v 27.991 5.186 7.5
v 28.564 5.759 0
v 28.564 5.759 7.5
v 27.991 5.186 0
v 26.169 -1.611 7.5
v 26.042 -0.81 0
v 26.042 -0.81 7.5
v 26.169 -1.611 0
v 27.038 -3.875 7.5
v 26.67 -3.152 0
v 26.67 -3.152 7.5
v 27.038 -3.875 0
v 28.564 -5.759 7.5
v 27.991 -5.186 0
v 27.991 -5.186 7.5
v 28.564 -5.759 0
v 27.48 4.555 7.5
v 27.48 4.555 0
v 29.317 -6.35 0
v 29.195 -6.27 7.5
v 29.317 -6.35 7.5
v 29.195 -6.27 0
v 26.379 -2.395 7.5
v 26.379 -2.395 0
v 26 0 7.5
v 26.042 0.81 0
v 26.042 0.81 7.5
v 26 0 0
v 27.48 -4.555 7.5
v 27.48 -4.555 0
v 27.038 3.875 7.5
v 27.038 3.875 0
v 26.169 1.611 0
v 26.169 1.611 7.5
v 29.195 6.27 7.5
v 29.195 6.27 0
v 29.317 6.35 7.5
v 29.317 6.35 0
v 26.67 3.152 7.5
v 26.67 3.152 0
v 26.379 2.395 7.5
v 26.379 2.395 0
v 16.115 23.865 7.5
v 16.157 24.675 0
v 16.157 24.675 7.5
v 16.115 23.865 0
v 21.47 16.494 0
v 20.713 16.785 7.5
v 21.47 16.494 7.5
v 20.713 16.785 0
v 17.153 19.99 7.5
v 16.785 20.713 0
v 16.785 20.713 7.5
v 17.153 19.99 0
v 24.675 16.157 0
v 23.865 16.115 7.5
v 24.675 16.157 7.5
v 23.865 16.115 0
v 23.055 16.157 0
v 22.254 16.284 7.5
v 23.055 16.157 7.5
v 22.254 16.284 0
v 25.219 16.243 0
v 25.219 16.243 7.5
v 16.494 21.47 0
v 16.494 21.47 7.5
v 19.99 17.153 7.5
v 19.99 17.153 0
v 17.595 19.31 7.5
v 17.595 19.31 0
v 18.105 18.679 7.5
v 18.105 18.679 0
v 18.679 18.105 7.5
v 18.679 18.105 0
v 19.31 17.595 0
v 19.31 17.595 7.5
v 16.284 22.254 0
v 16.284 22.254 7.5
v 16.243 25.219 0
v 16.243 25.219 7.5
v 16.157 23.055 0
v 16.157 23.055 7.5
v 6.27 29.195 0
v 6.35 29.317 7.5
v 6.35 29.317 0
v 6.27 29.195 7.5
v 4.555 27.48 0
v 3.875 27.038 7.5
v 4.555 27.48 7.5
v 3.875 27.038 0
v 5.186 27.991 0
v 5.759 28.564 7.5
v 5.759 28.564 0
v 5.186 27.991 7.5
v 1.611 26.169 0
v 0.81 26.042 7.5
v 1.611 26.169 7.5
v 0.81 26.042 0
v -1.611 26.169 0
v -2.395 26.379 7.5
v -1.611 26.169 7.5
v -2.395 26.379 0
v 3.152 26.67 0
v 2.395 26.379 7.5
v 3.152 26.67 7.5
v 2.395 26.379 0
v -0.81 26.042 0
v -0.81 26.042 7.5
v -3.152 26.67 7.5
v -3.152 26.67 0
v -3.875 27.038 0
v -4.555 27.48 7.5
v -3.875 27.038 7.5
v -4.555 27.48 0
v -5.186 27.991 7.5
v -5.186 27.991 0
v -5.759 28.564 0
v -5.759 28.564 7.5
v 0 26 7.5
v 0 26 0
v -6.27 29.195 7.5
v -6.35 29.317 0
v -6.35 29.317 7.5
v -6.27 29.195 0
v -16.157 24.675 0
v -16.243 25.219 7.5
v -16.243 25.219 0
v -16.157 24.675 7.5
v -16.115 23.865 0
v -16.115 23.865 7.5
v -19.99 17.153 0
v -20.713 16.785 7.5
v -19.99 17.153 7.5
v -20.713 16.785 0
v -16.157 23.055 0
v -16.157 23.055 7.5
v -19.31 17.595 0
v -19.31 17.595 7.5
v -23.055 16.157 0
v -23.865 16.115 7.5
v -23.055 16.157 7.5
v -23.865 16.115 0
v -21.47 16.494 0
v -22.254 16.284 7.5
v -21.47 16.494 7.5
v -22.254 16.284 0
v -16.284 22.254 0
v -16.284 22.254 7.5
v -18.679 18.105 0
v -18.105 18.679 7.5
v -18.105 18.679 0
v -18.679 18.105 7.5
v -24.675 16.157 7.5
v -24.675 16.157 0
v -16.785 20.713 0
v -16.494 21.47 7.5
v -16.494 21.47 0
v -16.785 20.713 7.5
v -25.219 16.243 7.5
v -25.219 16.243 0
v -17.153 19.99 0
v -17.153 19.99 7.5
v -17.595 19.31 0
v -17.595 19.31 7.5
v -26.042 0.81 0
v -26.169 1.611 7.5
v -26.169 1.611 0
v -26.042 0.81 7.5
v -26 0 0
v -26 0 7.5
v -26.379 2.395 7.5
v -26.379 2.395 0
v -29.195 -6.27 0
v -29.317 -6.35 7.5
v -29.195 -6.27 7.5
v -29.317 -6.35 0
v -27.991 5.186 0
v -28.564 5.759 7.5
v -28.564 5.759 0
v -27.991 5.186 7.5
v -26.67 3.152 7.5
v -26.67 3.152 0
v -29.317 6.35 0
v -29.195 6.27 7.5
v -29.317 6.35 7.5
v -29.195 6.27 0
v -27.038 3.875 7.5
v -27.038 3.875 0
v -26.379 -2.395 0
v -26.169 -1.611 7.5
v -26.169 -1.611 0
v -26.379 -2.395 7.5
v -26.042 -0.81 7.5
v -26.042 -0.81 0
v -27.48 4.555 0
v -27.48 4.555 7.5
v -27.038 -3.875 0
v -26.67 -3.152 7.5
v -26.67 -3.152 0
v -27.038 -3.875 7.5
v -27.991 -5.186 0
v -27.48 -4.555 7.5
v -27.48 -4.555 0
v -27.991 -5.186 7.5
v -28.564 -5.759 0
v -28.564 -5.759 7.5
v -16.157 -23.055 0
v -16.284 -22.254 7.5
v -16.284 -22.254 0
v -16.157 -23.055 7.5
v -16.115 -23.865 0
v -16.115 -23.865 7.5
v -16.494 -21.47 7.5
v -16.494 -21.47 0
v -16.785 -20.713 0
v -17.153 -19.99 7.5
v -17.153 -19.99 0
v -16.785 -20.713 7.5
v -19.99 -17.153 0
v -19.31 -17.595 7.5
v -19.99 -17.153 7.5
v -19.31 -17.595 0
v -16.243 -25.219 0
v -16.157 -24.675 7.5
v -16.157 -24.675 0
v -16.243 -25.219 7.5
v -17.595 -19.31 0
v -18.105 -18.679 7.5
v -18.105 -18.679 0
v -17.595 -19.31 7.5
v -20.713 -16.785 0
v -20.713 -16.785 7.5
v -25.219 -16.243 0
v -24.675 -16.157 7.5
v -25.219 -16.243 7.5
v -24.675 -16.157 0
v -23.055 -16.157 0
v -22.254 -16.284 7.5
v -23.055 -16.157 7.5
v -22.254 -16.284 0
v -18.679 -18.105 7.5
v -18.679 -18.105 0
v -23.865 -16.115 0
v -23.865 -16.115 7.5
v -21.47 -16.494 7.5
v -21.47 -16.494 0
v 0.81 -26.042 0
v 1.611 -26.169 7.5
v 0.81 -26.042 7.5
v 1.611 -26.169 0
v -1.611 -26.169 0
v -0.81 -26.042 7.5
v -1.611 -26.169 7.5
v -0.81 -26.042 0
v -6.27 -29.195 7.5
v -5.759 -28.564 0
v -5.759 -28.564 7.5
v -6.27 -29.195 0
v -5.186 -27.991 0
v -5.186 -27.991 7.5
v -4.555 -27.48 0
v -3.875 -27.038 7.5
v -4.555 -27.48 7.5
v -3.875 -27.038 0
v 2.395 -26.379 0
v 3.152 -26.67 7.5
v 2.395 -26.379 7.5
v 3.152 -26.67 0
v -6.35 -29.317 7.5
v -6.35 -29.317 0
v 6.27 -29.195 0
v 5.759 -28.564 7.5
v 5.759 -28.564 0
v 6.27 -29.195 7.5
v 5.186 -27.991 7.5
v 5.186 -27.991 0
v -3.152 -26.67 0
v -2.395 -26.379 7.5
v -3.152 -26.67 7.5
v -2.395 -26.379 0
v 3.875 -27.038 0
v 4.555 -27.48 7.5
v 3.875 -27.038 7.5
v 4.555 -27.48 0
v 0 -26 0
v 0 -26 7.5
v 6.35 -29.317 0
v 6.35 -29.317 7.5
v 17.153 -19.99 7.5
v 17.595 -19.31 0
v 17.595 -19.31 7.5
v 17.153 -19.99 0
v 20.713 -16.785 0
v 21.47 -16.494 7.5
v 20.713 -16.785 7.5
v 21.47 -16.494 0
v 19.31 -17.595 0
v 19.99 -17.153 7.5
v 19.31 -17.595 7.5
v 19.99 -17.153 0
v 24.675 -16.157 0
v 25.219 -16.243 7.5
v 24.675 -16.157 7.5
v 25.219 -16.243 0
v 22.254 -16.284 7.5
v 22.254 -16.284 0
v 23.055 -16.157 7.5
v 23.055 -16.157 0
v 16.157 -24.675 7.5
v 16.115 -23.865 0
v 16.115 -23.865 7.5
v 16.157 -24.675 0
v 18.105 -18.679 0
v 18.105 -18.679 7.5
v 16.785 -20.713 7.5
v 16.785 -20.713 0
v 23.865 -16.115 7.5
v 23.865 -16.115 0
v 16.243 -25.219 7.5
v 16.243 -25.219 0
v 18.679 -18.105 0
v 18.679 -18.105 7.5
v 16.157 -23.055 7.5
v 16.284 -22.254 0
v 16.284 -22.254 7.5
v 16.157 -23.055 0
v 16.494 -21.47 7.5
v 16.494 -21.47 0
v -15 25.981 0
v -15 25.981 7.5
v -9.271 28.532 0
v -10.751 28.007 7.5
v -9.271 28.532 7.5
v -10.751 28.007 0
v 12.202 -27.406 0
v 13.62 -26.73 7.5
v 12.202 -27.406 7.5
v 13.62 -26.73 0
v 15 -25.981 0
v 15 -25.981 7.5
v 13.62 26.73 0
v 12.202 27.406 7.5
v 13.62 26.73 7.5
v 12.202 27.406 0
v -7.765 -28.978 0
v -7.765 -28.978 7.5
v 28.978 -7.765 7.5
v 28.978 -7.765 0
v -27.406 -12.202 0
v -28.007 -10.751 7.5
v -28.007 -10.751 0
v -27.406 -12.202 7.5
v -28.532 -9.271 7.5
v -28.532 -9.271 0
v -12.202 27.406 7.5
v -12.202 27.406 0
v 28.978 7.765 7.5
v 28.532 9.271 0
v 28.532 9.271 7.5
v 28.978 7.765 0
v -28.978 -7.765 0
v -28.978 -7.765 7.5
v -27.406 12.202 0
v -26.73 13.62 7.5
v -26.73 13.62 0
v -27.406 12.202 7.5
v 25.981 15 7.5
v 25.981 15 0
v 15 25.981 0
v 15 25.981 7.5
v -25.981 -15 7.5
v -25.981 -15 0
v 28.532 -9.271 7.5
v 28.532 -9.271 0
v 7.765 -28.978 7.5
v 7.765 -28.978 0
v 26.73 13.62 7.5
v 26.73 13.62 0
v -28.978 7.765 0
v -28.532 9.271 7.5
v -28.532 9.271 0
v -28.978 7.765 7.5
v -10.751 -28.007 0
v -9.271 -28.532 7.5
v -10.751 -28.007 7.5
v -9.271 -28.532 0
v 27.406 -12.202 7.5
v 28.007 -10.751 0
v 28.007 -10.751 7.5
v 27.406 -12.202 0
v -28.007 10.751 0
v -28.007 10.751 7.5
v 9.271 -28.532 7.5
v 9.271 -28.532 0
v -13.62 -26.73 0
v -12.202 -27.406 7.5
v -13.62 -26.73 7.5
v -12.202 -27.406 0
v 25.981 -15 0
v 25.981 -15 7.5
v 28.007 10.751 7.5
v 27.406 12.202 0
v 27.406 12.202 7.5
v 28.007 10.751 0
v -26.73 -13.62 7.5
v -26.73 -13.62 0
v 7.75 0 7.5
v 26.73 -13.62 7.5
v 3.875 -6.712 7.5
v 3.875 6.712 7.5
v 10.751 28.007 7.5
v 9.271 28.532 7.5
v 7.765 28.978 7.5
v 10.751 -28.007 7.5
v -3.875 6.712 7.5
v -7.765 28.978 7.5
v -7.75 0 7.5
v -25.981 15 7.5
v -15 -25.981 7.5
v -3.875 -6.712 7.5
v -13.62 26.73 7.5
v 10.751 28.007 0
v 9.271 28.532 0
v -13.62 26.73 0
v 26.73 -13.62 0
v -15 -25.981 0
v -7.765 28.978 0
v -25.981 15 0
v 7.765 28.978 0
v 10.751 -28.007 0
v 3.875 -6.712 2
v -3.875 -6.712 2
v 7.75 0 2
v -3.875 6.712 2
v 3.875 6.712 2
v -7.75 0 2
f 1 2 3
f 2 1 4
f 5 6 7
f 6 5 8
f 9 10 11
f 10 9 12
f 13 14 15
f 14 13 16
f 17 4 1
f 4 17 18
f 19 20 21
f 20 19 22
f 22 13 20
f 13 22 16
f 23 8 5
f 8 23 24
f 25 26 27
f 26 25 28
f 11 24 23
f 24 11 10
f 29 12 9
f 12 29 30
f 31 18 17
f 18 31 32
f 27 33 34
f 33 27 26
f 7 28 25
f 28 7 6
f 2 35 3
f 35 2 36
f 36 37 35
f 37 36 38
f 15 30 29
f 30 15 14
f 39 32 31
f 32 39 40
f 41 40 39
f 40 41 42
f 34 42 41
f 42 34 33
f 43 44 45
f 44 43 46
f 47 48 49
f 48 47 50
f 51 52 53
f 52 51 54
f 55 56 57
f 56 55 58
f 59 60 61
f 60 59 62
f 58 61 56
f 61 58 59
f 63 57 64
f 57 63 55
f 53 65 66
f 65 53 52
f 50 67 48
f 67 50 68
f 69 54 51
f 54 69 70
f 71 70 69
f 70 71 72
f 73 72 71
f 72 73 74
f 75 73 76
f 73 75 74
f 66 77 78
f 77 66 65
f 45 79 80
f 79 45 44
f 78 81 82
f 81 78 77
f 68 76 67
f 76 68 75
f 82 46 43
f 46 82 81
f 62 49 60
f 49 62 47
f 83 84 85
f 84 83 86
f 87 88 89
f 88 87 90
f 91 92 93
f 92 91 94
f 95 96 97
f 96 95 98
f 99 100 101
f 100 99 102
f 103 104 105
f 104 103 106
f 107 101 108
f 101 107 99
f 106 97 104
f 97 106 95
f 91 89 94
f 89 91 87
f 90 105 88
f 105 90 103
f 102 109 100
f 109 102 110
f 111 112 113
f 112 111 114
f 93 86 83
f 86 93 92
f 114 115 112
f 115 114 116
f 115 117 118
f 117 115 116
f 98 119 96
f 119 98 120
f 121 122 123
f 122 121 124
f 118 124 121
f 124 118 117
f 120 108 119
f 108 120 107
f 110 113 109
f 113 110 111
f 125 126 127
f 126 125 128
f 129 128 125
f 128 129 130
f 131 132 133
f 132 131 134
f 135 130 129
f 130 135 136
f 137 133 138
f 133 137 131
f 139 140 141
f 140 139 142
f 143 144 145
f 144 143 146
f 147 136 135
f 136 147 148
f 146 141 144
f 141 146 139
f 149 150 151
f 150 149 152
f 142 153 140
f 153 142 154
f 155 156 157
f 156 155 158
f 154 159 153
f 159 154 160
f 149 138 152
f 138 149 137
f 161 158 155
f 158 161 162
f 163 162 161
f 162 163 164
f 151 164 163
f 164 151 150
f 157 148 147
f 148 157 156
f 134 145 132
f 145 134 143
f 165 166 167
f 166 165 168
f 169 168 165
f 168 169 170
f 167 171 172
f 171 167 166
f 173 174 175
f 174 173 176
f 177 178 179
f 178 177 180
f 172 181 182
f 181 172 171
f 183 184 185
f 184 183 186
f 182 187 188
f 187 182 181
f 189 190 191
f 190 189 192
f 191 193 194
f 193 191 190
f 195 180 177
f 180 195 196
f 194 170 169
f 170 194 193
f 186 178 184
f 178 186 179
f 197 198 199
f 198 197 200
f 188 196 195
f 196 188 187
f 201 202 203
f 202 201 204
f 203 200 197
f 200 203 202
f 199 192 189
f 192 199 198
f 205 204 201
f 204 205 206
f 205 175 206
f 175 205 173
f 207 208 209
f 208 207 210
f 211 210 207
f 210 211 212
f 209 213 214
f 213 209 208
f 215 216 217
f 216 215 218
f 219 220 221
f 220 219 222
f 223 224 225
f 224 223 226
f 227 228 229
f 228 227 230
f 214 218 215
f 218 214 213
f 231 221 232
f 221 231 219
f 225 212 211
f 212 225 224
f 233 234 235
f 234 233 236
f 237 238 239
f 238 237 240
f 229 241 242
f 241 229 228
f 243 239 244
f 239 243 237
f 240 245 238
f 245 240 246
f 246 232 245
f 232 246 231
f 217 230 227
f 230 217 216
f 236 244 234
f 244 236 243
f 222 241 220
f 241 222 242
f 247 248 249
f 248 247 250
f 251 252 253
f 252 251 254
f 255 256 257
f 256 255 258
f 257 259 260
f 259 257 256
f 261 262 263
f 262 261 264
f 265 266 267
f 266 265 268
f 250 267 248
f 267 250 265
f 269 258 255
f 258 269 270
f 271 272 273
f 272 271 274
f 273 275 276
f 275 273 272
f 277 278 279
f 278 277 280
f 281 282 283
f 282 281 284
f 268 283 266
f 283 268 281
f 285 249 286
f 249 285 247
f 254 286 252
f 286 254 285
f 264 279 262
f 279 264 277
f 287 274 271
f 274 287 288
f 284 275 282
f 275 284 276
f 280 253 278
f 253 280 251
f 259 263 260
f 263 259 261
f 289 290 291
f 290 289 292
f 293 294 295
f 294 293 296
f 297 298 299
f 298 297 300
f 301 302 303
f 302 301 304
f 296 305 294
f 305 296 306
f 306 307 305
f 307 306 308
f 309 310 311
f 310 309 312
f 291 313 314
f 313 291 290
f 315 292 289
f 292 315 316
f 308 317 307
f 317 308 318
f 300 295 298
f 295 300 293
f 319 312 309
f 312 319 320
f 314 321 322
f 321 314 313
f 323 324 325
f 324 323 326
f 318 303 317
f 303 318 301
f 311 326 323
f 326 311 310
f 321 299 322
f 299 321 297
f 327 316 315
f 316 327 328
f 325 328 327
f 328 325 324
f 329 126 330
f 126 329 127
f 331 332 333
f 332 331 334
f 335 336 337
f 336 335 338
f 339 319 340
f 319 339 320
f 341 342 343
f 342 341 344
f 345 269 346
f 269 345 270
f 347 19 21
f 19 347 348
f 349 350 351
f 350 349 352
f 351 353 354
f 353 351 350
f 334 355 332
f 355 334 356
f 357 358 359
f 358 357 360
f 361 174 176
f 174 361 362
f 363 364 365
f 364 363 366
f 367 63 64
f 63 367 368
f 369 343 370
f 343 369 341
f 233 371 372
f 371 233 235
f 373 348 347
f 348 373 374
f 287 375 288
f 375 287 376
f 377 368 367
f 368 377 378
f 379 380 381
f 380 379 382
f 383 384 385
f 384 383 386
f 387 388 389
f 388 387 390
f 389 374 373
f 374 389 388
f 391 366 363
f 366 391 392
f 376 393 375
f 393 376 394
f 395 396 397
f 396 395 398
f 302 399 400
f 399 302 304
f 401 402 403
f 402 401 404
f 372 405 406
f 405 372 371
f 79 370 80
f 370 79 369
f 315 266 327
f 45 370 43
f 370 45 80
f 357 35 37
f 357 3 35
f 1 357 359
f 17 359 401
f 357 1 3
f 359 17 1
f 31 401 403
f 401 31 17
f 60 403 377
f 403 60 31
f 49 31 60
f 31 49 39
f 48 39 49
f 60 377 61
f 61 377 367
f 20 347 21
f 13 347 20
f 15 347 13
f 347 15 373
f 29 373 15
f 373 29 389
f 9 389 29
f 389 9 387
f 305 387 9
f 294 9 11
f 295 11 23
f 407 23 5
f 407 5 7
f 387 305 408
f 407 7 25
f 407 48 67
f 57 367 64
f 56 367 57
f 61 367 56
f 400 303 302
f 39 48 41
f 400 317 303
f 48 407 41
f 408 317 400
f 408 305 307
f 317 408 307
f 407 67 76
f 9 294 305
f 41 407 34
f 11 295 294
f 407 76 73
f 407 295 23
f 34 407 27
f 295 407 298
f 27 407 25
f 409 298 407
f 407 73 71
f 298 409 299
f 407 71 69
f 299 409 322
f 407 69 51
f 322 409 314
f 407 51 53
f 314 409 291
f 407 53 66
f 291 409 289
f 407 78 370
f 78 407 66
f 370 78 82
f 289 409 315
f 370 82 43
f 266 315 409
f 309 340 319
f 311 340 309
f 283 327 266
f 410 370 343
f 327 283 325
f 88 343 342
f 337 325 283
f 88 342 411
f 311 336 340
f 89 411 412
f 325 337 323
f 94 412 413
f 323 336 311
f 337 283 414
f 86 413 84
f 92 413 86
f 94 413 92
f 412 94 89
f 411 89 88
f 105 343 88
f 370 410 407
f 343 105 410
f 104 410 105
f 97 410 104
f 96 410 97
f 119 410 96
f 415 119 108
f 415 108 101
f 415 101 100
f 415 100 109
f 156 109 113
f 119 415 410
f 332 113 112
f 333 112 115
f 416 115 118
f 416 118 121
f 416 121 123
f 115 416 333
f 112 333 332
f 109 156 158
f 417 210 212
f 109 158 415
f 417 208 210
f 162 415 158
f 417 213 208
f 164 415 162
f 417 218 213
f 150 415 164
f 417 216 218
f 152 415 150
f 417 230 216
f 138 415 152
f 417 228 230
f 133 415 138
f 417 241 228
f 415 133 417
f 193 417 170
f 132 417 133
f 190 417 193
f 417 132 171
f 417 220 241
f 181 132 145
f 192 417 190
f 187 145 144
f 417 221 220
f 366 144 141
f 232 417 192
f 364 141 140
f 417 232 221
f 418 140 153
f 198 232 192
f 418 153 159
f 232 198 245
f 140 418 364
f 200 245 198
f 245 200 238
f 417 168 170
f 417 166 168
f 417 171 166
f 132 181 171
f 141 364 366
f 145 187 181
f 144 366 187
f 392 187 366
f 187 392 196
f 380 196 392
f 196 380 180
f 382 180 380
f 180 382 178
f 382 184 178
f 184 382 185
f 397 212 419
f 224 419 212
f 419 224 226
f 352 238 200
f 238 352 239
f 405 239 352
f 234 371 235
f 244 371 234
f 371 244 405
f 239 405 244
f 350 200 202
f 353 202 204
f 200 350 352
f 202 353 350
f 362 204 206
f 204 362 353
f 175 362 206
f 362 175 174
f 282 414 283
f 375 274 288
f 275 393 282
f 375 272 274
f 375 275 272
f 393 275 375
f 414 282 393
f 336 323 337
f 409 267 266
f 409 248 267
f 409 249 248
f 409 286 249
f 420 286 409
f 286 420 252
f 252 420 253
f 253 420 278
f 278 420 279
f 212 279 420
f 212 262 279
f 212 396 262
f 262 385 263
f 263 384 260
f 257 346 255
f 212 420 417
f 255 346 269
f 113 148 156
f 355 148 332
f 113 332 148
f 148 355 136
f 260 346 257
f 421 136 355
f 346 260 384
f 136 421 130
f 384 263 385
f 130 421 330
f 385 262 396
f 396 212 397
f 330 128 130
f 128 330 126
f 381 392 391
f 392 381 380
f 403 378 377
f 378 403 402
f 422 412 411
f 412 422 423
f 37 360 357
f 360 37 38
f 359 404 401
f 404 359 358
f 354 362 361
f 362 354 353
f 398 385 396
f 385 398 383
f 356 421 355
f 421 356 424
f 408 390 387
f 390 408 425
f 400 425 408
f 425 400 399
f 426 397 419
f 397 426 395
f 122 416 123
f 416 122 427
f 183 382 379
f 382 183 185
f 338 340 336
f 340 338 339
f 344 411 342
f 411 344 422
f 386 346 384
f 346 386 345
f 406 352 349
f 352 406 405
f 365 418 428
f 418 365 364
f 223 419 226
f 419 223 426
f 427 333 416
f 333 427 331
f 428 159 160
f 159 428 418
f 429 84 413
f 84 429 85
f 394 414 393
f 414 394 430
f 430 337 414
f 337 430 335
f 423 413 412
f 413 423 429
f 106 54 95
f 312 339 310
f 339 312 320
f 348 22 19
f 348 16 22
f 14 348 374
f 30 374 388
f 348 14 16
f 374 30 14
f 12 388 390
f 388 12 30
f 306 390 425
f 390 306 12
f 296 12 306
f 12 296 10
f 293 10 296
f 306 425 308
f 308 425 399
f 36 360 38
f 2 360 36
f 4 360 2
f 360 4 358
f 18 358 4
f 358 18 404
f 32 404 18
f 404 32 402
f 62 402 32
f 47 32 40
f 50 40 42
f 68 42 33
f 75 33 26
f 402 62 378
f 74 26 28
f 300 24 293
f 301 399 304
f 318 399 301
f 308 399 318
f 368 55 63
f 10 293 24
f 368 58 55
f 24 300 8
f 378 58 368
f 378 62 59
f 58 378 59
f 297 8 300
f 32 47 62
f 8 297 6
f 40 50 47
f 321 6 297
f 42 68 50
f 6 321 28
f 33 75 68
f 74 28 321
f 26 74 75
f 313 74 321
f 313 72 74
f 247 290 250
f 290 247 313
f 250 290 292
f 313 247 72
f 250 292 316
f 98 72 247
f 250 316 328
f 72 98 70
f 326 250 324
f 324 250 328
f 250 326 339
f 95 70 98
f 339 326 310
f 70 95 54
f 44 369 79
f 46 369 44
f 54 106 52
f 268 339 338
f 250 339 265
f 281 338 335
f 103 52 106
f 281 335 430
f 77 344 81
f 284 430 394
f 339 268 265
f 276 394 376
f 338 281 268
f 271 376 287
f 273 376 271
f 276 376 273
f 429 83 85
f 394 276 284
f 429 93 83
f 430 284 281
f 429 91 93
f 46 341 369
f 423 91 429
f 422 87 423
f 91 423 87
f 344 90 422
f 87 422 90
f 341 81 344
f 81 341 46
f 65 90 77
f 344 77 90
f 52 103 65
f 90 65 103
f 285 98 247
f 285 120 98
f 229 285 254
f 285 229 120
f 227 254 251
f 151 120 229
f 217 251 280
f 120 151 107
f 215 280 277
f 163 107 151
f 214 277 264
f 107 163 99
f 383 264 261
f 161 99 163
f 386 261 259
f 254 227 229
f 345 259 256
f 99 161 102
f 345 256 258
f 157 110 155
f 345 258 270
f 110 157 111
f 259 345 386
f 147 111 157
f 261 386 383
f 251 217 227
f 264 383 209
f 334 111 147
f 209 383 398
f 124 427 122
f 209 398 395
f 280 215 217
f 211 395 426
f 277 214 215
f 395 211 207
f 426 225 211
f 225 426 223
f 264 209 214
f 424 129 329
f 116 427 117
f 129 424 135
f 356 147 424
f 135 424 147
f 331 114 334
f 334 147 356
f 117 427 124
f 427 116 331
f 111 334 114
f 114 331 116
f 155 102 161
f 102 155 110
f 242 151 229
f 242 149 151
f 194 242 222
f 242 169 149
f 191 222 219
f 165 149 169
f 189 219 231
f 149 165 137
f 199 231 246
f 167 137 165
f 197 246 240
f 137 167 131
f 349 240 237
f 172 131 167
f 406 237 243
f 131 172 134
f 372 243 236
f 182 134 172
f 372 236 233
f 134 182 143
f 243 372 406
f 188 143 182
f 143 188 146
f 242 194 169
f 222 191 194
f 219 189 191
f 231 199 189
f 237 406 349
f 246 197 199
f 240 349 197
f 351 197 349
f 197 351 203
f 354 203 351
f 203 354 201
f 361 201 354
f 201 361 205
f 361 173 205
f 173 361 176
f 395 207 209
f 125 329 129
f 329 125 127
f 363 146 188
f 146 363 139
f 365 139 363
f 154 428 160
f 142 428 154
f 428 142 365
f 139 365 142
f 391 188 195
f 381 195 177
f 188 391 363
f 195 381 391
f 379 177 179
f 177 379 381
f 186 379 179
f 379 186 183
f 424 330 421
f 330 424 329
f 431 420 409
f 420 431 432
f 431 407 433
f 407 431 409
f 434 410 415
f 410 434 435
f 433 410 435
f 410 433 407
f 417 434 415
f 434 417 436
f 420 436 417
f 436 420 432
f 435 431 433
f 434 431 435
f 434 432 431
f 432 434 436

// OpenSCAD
h = 5.5;
wall = 2;
d = 15;
gap = 0.25;
outerd = 60;

difference(){
    cylinder(wall+h, d=outerd, center = false, $fn=120);
    
    translate([0,0,wall]){
        cylinder(100, d=d+2*gap, center = false, $fn=6);
    }
    
    for(a=[0:45:359]){
        translate([(outerd/2+d/4)*cos(a),(outerd/2+d/4)*sin(a),-gap]){
            cylinder(100, d=d+2*gap, center = false, $fn=60);
        }
    }
}
